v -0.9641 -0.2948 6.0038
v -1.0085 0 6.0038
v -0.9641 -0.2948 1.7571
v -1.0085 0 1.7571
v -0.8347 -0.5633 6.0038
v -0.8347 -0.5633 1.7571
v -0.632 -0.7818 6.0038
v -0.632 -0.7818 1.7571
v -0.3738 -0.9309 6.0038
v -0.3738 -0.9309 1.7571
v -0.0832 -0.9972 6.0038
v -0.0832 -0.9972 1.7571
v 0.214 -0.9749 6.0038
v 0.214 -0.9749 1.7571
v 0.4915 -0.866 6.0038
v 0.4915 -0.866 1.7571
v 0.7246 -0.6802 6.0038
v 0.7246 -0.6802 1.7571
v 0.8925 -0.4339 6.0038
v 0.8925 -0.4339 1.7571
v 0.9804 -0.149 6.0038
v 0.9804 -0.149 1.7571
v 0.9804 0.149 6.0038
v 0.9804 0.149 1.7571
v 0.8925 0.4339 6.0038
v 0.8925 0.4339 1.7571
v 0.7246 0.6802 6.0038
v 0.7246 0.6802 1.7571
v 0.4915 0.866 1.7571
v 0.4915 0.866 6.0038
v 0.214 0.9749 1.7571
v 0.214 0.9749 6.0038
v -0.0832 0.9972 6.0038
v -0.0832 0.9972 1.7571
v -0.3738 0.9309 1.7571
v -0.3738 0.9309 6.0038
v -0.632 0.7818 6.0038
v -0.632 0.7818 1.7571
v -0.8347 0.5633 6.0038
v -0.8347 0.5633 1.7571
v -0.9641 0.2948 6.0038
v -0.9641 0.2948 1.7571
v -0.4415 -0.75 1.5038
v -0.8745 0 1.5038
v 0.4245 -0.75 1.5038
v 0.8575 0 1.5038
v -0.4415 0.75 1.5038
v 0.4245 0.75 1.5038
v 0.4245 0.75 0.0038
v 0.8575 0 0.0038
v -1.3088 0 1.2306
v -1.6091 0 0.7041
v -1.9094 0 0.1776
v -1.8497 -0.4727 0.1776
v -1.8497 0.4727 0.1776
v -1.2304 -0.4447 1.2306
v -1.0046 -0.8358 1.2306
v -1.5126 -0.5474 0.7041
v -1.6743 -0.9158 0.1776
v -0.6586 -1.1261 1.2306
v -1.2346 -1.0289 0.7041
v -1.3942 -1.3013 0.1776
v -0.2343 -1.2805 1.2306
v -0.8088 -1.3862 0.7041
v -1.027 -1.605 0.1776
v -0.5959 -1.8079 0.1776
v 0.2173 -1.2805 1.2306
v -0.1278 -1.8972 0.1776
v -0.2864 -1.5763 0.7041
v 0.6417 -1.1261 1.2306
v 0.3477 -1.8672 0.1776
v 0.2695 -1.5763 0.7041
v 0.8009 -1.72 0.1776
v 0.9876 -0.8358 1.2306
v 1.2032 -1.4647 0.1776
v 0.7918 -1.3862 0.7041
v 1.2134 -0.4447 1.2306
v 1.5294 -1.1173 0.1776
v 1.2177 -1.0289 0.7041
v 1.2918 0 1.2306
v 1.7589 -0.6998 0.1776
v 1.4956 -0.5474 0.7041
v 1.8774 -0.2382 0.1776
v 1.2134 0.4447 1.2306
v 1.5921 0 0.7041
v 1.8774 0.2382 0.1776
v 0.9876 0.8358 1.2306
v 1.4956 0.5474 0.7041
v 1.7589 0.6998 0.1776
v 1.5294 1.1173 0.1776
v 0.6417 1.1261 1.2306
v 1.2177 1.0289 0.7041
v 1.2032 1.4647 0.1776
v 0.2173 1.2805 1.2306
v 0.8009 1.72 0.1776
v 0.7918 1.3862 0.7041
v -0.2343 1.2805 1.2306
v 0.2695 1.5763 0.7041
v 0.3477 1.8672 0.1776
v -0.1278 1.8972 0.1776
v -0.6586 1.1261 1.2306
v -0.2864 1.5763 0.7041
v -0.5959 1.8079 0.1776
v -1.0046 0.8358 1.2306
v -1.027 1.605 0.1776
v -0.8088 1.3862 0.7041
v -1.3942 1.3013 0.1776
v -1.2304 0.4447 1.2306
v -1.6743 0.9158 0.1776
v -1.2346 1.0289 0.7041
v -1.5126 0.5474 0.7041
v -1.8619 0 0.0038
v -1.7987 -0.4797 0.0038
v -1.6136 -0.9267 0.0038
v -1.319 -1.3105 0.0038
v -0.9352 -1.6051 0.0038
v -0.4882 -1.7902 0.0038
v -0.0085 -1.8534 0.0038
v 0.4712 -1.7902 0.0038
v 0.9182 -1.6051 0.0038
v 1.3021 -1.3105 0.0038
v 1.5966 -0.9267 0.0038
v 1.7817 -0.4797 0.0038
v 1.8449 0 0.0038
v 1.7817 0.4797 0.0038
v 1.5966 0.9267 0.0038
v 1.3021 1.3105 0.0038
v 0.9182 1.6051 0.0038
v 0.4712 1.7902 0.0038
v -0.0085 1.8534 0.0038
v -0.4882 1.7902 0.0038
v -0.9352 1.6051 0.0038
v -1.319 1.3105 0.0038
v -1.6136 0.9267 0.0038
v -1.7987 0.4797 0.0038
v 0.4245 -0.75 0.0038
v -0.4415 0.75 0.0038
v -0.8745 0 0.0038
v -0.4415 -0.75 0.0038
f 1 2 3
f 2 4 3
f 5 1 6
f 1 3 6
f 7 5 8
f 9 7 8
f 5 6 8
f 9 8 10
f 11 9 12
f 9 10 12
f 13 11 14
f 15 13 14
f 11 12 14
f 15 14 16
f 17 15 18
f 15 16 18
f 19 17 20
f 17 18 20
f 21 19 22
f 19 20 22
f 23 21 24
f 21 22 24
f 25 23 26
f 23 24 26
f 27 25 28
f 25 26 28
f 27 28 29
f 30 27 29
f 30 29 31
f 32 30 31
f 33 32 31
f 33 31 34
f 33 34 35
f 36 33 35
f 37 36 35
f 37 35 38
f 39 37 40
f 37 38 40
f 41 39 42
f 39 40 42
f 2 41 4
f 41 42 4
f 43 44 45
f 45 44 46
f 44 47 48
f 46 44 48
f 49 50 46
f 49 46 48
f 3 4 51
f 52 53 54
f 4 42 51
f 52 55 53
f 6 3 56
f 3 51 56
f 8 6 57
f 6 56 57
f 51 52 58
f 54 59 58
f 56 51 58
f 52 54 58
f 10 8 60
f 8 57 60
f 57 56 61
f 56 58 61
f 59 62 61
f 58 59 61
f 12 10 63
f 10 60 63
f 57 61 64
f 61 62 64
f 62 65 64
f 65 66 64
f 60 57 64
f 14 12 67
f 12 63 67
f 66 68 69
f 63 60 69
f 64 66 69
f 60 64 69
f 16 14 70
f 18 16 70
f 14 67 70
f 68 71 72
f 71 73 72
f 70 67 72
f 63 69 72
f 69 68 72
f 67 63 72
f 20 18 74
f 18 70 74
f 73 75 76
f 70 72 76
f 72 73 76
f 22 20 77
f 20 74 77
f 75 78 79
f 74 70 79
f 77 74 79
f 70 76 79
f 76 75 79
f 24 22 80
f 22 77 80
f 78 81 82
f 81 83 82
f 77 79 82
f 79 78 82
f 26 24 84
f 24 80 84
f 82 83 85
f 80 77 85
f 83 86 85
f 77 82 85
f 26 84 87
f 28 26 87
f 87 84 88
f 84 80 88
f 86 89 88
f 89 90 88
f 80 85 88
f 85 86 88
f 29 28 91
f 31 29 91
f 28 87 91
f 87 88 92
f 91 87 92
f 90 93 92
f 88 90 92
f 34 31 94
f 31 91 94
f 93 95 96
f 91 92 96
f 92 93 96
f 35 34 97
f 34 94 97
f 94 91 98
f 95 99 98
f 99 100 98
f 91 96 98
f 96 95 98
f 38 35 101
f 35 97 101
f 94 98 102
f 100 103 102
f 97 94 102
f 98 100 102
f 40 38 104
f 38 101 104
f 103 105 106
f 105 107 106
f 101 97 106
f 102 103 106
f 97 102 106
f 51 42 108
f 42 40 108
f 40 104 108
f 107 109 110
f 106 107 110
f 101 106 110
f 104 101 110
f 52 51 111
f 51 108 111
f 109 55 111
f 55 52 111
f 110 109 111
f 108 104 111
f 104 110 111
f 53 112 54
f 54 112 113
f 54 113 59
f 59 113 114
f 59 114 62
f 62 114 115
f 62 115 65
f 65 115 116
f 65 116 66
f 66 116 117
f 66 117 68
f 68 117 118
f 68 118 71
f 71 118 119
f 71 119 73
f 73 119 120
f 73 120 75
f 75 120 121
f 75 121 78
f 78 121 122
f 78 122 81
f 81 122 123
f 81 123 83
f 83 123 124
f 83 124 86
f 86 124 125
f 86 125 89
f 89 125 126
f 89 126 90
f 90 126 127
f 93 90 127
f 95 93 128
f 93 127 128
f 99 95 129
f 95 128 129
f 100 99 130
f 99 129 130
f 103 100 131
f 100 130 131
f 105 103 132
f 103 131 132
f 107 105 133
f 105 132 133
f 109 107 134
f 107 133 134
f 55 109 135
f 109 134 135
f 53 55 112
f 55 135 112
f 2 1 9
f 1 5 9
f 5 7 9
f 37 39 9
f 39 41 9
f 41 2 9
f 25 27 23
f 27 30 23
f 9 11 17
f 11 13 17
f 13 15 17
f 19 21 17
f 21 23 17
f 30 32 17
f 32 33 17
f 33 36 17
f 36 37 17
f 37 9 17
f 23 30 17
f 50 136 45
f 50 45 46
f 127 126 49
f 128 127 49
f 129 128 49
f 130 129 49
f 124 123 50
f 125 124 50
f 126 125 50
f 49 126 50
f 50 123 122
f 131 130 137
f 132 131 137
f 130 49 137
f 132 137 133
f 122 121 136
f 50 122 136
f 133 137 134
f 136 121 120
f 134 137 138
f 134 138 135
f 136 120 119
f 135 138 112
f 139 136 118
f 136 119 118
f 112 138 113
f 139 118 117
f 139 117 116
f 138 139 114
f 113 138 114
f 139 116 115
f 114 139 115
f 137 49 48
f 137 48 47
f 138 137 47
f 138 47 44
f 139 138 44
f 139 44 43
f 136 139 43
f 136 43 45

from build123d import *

# Parameters (mm, degrees)
CUT_EXTRUDE_1_DEPTH = 1.5
CHAMFER_1_SIZE      = 0.2
CHAMFER_1_SIZE2     = 0.146618763


with BuildPart() as part:
    # 草图1 → 旋转5 (revolve)
    with BuildSketch(Plane(origin=(0, 0, 0), x_dir=(1, 0, 0), z_dir=(0, 1, 0))):
        Polygon((-2.008479615, -0.003832891), (-0.008479615, -0.003832891), (-0.008479615, -6.003832891), (-1.008479615, -6.003832891), (-1.008479615, -1.757110008), align=None)
    revolve(axis=Axis((-0.008479615, 0, 0.003832891), (0, 0, 1)))

    # 草图2 → 切除-拉伸1 (cut)
    with BuildSketch(Plane.XY.offset(0.003832891)):
        Polygon((0.857545789, 0), (0.424533087, 0.75), (-0.441492317, 0.75), (-0.874505018, 0), (-0.441492317, -0.75), (0.424533087, -0.75), align=None)
    extrude(amount=CUT_EXTRUDE_1_DEPTH, mode=Mode.SUBTRACT)

    # 倒角1
    chamfer_1_edges = [part.edges().sort_by_distance(p)[0] for p in [
        (1.991520385, 0, 0.003832891),
    ]]
    chamfer_1_side = [part.faces().sort_by_distance(p)[0] for p in [
        (1.491520385, 0, 0.880471449),
    ]]
    chamfer(chamfer_1_edges, length=CHAMFER_1_SIZE, length2=CHAMFER_1_SIZE2, reference=chamfer_1_side[0])


solid = part.part
